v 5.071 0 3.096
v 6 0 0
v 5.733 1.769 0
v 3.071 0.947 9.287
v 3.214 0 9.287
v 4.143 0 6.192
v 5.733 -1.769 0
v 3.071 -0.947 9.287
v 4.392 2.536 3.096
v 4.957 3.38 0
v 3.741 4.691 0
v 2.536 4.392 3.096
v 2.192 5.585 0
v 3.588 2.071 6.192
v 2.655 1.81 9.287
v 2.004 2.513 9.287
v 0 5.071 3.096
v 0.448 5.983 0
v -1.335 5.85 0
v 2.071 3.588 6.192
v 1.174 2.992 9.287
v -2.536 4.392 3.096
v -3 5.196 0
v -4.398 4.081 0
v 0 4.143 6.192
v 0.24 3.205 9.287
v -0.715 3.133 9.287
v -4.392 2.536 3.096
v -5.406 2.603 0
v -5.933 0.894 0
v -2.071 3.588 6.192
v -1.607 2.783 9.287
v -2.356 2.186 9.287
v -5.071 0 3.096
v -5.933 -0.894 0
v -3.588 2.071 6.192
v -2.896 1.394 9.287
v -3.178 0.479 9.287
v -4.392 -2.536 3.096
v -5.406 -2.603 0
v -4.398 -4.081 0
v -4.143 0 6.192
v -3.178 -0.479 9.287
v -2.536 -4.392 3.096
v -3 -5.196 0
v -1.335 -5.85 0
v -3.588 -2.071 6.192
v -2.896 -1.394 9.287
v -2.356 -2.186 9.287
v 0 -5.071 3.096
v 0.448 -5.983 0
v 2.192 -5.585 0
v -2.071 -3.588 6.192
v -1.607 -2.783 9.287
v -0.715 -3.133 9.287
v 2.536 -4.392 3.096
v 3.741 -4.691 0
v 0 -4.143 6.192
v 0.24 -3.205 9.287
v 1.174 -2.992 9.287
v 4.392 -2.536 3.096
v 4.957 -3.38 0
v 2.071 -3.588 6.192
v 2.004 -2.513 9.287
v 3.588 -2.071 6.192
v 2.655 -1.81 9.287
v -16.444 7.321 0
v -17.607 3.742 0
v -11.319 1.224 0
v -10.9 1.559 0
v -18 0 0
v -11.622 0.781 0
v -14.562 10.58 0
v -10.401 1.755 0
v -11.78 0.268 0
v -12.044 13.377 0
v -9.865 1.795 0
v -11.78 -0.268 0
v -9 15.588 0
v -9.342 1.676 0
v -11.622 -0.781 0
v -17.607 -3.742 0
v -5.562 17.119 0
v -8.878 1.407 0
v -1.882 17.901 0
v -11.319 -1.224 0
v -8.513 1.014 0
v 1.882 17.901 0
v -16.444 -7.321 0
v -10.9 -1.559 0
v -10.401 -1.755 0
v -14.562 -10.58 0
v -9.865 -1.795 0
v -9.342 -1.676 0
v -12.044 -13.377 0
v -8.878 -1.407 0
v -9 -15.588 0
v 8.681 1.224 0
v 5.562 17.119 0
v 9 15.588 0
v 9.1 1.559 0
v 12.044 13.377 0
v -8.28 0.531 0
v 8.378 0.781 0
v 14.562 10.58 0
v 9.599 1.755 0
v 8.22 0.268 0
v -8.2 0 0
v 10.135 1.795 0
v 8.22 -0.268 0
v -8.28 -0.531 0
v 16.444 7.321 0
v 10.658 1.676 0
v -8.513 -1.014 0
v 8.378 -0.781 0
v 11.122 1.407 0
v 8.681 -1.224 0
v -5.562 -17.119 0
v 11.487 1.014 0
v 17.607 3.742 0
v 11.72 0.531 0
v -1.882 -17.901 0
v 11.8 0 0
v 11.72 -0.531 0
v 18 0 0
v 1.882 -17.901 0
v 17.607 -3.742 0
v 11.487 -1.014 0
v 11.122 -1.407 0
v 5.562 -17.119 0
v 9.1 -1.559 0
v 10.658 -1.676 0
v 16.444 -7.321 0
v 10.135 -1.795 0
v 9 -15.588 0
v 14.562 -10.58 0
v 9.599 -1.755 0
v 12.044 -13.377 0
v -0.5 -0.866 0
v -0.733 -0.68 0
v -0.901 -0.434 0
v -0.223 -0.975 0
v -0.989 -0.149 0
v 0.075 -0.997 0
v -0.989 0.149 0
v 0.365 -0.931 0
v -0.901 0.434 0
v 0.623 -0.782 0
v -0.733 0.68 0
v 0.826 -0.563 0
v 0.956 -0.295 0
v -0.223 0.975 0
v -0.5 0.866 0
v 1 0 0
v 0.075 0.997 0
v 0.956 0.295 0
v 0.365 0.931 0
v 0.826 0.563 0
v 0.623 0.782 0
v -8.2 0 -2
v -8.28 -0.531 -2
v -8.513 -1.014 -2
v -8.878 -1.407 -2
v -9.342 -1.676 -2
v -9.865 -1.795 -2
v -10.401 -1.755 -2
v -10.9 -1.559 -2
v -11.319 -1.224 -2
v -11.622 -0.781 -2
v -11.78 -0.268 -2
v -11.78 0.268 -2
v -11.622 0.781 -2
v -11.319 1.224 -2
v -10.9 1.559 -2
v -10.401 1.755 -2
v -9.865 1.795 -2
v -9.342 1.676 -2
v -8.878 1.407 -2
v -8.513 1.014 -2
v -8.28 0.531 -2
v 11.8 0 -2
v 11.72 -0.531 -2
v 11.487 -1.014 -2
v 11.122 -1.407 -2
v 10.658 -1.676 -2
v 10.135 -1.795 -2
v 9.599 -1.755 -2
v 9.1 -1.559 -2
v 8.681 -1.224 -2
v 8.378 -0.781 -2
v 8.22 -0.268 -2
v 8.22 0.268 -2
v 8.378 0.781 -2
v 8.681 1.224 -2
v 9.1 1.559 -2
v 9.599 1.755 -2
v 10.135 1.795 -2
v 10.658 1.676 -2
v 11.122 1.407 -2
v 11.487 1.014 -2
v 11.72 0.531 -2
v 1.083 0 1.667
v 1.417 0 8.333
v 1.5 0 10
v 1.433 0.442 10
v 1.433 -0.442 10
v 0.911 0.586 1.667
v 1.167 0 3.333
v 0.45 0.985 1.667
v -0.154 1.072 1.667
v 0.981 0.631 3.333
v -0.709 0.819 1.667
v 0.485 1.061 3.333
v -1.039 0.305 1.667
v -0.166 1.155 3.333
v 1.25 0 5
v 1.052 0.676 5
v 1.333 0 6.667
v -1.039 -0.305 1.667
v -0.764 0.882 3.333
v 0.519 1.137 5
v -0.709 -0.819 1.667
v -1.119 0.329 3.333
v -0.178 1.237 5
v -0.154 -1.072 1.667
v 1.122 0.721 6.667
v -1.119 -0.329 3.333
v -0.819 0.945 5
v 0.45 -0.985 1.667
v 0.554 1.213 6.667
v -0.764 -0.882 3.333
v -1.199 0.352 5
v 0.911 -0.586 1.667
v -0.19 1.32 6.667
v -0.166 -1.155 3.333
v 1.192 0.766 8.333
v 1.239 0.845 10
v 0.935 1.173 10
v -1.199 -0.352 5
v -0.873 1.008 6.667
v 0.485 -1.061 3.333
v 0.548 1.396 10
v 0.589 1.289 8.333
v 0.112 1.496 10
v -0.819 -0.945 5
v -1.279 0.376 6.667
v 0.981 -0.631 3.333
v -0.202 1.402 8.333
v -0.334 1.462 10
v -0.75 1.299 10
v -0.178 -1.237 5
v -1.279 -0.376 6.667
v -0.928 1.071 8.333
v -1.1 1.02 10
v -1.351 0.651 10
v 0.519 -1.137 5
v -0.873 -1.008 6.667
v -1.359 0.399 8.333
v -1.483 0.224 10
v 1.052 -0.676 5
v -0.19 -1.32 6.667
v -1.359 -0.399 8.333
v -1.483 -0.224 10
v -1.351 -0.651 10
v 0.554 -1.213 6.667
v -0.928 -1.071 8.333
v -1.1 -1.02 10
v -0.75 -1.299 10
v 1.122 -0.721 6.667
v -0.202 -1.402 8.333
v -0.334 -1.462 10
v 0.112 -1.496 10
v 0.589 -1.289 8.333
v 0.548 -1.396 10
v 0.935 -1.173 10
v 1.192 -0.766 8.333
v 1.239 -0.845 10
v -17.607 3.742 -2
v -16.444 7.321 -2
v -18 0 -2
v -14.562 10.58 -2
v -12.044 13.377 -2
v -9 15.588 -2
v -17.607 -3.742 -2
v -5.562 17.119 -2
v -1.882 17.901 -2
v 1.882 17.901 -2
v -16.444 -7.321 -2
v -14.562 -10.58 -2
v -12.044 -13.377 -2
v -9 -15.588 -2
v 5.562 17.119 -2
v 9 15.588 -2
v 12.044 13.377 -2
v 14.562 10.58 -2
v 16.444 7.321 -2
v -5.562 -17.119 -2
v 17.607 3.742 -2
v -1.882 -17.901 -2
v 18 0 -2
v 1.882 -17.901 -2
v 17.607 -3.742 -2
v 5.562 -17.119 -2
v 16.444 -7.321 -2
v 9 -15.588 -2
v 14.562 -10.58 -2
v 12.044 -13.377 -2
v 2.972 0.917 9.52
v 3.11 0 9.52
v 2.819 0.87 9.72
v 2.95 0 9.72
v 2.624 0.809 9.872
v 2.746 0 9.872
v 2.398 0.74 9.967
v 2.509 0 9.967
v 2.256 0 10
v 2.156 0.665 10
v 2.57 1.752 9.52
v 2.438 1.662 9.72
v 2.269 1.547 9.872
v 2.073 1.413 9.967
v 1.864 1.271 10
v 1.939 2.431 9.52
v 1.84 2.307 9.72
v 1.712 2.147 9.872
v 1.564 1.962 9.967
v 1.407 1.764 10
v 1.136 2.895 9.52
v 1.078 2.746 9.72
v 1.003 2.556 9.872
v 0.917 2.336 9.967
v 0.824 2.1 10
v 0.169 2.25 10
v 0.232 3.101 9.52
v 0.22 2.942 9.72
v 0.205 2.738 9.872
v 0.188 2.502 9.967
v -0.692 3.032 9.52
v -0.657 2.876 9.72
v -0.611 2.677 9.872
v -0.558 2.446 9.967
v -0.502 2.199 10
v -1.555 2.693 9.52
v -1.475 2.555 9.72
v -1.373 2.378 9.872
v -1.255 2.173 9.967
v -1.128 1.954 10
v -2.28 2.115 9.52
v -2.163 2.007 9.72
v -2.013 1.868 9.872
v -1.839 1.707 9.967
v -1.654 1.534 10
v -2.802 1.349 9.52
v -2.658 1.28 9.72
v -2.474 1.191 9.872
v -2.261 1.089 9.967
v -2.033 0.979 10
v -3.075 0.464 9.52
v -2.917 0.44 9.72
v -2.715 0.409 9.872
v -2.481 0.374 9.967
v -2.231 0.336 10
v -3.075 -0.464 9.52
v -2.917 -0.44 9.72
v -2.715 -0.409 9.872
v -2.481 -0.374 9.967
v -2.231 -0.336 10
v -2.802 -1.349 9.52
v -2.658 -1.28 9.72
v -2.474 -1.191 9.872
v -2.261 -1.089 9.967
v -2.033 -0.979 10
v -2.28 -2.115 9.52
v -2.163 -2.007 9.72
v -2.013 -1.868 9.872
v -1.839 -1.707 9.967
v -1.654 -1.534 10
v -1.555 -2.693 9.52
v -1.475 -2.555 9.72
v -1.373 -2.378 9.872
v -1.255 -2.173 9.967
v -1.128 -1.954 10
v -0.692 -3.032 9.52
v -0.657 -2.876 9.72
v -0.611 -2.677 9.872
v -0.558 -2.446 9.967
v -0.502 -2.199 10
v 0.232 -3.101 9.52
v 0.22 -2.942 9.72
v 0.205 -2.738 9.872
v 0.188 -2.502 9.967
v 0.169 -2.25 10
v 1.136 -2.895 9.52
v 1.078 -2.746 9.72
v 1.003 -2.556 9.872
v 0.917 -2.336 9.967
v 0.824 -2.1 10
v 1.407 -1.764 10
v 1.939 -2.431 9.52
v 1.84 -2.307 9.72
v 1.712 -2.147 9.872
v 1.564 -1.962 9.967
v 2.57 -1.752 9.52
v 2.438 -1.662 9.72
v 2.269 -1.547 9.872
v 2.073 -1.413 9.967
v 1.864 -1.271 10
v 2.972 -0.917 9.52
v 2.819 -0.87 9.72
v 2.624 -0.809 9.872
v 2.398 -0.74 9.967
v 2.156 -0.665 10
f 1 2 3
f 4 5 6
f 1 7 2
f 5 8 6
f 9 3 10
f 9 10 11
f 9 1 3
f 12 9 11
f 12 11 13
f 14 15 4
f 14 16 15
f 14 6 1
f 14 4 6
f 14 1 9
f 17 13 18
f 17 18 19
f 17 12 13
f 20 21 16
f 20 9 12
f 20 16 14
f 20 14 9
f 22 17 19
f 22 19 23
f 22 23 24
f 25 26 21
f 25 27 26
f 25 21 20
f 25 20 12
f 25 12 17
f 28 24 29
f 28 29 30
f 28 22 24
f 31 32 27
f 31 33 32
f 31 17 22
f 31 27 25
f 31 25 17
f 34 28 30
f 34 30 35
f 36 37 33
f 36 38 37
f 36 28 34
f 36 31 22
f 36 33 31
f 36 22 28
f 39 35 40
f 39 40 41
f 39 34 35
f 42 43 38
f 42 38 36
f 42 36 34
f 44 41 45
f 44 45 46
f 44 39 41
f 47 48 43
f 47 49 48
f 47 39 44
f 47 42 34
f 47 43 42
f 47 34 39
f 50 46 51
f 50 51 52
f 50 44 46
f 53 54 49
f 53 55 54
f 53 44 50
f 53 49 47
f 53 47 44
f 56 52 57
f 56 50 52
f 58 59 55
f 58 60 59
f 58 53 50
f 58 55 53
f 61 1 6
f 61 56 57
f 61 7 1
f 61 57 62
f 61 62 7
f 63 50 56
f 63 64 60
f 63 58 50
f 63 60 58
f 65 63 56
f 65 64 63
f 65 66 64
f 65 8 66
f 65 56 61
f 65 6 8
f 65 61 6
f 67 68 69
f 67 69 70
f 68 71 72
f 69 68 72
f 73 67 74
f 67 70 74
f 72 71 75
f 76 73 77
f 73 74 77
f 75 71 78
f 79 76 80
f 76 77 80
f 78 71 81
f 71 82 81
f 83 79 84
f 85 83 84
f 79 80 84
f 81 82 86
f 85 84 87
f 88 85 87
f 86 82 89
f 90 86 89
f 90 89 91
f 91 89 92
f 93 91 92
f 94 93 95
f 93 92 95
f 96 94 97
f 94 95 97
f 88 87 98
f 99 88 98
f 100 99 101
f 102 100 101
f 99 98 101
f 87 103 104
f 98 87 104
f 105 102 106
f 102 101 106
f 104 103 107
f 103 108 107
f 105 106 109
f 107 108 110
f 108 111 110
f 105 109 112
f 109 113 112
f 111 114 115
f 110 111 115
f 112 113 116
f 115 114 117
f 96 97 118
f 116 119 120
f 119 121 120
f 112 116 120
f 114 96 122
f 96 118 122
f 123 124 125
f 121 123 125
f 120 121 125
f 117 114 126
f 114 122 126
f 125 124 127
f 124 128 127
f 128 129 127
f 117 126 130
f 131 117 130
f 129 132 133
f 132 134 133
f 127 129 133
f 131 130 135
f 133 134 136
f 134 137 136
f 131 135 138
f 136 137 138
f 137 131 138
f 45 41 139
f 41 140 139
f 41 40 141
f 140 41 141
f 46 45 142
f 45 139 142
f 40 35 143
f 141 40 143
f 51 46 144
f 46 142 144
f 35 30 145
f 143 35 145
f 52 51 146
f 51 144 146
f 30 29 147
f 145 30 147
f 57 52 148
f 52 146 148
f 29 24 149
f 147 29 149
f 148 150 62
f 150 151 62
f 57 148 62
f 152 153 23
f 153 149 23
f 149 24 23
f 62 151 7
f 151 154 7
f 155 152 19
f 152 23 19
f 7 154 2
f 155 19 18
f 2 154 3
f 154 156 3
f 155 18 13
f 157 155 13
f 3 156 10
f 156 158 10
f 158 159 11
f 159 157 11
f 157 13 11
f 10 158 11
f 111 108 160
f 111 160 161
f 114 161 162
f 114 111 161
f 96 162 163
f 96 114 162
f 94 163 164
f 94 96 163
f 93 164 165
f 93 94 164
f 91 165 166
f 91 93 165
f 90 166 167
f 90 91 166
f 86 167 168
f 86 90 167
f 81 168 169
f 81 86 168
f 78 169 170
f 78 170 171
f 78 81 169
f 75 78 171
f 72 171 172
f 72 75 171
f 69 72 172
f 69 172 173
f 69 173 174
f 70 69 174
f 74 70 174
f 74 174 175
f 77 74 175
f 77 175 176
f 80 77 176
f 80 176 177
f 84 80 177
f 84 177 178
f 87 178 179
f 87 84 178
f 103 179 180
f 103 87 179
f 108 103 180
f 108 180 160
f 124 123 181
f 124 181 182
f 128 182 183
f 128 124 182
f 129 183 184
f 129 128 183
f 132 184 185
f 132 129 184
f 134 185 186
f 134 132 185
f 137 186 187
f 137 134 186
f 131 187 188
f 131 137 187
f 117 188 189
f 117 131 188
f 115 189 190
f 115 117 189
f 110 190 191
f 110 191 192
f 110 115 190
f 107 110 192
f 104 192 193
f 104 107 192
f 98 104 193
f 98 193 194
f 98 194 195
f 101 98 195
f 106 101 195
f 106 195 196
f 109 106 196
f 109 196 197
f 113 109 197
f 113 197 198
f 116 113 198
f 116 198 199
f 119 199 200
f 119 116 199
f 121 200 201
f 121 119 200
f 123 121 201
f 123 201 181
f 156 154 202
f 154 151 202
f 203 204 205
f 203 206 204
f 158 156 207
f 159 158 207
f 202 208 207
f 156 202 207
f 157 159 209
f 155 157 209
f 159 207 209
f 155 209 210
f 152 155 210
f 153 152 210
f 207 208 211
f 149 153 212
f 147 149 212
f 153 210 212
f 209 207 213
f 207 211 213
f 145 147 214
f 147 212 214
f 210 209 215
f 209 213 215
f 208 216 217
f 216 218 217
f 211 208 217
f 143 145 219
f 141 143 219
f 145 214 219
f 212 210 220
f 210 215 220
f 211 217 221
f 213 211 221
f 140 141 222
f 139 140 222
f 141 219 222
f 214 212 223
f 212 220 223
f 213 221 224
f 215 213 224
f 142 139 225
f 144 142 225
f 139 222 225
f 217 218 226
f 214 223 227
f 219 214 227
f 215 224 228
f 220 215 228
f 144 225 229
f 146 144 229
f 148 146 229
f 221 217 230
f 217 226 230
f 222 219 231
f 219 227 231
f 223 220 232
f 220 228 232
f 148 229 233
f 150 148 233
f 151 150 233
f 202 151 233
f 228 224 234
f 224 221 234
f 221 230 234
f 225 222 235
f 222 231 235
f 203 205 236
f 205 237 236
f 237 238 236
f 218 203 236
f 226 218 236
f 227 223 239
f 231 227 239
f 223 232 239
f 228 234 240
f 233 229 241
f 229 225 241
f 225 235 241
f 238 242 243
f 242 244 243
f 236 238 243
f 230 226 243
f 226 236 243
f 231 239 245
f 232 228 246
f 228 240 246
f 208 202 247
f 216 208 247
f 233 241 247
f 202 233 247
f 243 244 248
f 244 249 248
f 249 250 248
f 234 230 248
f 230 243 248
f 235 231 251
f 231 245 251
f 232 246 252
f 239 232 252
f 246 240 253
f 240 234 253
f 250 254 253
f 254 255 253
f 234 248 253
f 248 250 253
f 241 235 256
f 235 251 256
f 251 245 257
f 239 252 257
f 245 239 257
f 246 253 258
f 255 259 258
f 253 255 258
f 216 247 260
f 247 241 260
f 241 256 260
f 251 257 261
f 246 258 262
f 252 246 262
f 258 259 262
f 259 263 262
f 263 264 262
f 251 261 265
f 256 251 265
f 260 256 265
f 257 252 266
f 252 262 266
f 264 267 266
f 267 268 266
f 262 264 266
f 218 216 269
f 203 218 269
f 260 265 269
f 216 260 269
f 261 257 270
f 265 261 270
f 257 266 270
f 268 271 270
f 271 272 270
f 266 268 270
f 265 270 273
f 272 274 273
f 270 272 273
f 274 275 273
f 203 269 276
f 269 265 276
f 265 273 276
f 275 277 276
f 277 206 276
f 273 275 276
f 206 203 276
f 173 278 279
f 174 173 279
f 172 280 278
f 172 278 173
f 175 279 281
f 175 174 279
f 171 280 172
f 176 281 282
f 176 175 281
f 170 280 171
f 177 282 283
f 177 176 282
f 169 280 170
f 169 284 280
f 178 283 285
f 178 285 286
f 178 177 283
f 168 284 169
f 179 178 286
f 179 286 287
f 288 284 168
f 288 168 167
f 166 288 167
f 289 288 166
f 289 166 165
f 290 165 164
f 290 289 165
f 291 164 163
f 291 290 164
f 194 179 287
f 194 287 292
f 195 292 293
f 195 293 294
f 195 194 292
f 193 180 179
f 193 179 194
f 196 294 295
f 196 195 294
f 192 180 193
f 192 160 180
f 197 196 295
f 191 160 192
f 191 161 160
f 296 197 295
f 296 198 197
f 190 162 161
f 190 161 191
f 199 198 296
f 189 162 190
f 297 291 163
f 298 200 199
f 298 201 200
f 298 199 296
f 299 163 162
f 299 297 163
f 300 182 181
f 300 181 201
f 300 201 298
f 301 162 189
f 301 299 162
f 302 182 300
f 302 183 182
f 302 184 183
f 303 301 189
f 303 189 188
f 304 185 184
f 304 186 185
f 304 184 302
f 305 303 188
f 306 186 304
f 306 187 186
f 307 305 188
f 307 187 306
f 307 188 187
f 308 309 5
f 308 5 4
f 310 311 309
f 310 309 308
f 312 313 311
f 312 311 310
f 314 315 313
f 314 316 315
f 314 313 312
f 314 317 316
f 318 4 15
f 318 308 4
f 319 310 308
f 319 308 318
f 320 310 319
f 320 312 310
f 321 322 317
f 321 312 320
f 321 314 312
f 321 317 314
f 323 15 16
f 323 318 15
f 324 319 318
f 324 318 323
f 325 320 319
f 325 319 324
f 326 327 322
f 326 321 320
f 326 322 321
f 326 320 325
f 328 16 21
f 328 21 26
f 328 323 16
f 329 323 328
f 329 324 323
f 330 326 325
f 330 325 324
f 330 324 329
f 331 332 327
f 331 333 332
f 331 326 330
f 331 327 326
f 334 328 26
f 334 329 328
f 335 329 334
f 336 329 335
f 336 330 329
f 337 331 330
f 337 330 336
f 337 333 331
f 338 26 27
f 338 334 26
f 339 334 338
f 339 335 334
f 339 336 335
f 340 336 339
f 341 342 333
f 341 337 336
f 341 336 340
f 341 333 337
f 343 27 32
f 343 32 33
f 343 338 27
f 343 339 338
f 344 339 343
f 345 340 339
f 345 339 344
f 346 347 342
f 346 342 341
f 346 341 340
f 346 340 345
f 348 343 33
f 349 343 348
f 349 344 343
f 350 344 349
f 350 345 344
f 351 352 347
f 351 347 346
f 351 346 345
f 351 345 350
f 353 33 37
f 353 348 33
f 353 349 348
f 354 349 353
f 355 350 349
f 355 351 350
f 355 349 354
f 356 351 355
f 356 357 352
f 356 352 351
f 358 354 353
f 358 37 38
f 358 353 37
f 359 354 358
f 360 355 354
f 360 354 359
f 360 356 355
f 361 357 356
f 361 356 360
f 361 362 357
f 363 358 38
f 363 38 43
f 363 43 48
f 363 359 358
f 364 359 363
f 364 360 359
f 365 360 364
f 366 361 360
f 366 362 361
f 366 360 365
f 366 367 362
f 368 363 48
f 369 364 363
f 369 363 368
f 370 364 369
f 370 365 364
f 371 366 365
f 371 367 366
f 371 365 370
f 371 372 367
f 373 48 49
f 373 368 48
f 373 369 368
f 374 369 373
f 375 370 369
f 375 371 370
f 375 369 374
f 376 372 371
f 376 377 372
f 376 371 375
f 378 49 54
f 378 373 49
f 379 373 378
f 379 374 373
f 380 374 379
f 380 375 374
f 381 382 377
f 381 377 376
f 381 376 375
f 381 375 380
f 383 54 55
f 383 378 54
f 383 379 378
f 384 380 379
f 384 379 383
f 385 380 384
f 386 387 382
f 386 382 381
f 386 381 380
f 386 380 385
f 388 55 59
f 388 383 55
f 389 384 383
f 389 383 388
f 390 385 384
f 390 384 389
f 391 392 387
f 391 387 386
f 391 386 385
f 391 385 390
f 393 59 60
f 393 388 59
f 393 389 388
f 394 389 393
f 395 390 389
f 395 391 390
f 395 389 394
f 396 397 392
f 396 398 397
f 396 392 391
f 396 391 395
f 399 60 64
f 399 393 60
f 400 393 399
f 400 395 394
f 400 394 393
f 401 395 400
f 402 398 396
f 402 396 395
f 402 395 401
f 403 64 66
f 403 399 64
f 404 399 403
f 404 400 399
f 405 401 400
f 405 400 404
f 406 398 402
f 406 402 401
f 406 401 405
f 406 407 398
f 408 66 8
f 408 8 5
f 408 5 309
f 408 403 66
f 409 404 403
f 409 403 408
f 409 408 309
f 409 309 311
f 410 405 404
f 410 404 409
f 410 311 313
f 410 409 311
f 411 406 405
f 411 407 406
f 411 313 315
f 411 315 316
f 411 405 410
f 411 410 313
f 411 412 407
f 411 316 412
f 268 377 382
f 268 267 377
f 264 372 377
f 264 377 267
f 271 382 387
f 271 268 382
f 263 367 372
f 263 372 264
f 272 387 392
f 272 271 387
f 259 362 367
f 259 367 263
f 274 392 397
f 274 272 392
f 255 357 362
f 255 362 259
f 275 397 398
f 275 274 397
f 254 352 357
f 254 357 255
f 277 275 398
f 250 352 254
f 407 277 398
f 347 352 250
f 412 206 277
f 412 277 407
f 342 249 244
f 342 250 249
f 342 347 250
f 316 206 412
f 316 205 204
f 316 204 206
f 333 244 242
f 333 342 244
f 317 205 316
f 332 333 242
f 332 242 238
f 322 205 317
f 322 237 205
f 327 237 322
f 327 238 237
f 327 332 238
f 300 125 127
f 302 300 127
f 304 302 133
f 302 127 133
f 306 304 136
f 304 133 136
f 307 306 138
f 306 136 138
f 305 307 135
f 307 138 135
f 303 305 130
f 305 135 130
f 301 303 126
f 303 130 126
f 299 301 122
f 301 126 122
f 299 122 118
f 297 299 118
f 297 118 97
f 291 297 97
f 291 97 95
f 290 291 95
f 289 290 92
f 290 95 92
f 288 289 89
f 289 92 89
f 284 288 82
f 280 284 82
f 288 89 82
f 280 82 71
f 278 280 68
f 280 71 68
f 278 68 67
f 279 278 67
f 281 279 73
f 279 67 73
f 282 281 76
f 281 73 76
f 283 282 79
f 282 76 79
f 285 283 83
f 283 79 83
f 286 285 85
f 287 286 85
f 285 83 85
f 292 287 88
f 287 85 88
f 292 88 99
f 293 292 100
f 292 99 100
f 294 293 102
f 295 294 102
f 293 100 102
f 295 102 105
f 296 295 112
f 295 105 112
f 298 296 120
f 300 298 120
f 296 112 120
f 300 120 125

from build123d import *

# Parameters (mm, degrees)
SKETCH004_R   = 18
SKETCH004_R_2 = 1.8
PAD_DEPTH     = 2
SKETCH_R      = 1
SKETCH001_R   = 1.5
SKETCH002_R   = 6
SKETCH003_R   = 3
FILLET_R      = 1


with BuildPart() as pad:
    # Sketch004 → Pad (new body)
    with BuildSketch(Plane(origin=(0, 0, 0), x_dir=(1, 0, 0), z_dir=(0, 0, -1))):
        Circle(SKETCH004_R)
        with Locations((-10, 0)):
            Circle(SKETCH004_R_2, mode=Mode.SUBTRACT)
        with Locations((10, 0)):
            Circle(SKETCH004_R_2, mode=Mode.SUBTRACT)
    extrude(amount=PAD_DEPTH)


with BuildPart() as loft_body:
    # Sketch → Loft section 0
    with BuildSketch(Plane.XY):
        Circle(SKETCH_R)
    # Sketch001 → Loft section 1
    with BuildSketch(Plane.XY.offset(10)):
        Circle(SKETCH001_R)
    loft()


with BuildPart() as fillet_body:
    # Sketch002 → Loft001 section 0
    with BuildSketch(Plane.XY):
        Circle(SKETCH002_R)
    # Sketch003 → Loft001 section 1
    with BuildSketch(Plane.XY.offset(10)):
        Circle(SKETCH003_R)
    loft()

    # Cut: cut Loft body
    add(loft_body.part, mode=Mode.SUBTRACT)

    # Fillet
    fillet_edges = [fillet_body.edges().sort_by_distance(p)[0] for p in [
        (-3, 0, 10),
    ]]
    fillet(fillet_edges, radius=FILLET_R)


solid = Compound([pad.part, fillet_body.part])
